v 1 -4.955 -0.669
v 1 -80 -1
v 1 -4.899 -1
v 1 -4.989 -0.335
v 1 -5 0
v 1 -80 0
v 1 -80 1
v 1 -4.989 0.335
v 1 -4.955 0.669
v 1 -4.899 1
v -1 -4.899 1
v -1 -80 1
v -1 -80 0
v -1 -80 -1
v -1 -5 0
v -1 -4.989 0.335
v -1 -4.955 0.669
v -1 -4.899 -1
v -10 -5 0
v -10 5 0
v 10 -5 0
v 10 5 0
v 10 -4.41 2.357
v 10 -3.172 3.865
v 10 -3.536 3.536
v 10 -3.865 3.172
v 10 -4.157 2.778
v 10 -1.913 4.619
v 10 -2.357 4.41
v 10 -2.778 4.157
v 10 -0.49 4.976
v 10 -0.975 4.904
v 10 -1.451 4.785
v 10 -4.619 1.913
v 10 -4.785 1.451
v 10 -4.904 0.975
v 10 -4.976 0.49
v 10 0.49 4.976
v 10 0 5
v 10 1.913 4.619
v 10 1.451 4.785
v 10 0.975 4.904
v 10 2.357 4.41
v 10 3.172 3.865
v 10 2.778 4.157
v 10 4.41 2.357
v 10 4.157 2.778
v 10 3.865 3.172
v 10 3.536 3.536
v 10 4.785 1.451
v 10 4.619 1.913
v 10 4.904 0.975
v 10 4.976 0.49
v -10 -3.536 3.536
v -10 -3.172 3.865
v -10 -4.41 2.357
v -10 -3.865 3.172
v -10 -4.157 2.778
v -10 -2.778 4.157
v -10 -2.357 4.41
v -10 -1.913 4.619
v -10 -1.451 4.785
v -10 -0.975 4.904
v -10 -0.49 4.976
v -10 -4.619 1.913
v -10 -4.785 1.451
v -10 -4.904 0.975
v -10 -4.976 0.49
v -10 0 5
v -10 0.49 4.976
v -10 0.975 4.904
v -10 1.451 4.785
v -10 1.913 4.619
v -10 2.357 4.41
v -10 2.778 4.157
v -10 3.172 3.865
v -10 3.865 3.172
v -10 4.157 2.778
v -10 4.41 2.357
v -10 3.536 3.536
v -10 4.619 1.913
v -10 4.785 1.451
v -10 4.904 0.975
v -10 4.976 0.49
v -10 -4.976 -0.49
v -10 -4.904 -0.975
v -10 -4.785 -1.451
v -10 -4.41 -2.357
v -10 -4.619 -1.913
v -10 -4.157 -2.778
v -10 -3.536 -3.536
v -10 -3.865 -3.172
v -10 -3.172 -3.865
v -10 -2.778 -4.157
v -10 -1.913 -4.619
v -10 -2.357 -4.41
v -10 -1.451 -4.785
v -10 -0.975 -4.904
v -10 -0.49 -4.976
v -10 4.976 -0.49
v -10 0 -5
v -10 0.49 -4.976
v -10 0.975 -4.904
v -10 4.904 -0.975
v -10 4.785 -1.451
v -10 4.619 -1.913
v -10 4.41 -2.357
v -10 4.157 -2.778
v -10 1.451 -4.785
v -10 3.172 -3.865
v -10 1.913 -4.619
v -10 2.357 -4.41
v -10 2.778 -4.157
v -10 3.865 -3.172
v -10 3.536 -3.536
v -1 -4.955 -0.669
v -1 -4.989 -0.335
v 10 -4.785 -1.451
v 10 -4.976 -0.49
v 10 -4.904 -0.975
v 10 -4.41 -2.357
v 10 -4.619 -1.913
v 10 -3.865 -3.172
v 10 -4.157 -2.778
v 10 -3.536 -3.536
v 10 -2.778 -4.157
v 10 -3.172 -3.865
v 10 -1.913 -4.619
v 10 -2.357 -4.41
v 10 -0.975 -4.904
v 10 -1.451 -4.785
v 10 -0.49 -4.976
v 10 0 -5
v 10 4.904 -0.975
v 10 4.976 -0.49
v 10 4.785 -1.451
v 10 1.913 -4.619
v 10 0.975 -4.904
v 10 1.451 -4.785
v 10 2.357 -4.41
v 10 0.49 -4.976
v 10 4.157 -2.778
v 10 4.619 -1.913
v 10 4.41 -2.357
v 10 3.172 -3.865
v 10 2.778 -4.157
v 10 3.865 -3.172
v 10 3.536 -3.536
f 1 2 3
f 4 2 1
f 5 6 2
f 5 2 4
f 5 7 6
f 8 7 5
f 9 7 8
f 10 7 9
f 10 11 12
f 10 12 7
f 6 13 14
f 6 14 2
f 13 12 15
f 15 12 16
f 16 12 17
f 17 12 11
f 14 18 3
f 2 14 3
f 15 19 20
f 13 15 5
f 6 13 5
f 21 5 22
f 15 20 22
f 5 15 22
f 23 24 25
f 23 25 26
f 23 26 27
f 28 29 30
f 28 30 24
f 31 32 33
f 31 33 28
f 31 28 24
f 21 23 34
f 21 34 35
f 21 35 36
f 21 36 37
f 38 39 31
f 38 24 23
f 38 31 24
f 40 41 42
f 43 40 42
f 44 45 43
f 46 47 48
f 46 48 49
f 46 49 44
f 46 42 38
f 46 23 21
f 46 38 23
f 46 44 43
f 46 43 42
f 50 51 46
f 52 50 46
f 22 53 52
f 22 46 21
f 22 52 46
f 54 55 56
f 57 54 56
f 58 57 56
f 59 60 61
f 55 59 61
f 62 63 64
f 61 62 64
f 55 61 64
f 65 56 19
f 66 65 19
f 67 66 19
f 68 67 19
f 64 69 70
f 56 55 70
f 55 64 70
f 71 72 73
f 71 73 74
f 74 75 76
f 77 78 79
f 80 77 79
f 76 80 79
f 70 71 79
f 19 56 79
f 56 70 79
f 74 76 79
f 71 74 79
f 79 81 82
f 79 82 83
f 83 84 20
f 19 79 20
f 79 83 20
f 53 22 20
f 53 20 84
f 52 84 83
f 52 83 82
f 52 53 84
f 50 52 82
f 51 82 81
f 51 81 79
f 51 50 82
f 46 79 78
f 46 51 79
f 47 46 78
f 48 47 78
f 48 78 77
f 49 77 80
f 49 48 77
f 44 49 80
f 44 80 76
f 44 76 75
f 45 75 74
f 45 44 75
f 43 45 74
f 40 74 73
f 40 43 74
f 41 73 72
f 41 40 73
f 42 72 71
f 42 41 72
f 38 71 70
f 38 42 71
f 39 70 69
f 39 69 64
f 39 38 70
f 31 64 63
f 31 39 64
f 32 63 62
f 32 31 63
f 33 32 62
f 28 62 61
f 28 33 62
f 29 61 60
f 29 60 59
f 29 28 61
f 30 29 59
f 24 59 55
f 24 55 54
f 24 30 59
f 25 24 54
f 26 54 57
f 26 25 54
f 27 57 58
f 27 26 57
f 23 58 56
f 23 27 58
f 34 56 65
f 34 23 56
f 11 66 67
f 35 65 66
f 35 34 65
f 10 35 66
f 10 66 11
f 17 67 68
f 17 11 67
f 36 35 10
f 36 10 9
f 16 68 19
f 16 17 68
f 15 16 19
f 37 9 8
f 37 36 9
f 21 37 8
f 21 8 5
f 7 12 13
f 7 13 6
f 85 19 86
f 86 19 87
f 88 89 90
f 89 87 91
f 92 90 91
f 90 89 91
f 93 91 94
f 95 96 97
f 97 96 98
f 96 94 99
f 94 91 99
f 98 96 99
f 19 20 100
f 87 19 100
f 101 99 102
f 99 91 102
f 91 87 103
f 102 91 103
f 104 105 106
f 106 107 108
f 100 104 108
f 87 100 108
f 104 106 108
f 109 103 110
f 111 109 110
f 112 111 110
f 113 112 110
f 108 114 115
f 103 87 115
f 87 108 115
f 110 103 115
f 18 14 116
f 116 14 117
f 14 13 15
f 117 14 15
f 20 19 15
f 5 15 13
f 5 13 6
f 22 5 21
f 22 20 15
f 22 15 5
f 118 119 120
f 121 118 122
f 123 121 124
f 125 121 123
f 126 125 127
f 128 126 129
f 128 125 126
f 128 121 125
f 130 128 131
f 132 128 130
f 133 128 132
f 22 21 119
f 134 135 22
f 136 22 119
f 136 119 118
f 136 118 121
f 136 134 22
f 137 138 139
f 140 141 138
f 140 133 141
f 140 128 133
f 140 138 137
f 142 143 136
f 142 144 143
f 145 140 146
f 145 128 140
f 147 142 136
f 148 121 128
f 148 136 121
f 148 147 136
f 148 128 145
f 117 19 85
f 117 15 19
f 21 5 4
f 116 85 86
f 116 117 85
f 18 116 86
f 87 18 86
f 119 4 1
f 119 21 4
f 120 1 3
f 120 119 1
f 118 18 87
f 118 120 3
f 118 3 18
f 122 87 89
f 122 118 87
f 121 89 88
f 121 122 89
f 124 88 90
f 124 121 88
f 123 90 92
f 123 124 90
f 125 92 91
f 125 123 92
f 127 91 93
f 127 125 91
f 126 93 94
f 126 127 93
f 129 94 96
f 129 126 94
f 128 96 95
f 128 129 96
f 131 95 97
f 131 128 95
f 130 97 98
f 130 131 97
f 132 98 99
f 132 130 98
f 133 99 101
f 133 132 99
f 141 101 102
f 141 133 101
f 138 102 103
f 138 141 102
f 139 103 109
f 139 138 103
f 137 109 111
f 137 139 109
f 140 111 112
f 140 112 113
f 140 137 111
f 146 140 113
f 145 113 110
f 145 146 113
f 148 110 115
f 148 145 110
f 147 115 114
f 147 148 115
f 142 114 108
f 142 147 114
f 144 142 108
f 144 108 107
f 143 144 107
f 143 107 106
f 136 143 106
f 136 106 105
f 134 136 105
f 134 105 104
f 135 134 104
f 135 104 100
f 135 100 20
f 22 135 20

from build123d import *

# Parameters (mm, degrees)
SKETCH1_R           = 5
BOSS_EXTRUDE1_DEPTH = 10
SKETCH2_W           = 2
SKETCH2_H           = 80
BOSS_EXTRUDE2_DEPTH = 1


with BuildPart() as part:
    # Sketch1 → Boss-Extrude1 (new, symmetric)
    with BuildSketch(Plane(origin=(0, 0, 0), x_dir=(0, 0, -1), z_dir=(1, 0, 0))):
        Circle(SKETCH1_R)
    extrude(amount=BOSS_EXTRUDE1_DEPTH, both=True)

    # Sketch2 → Boss-Extrude2 (add, symmetric)
    with BuildSketch(Plane.XY):
        with Locations((0, -40)):
            Rectangle(SKETCH2_W, SKETCH2_H)
    extrude(amount=BOSS_EXTRUDE2_DEPTH, both=True)


with BuildPart() as body_2:
    # Split1: the piece on the far side of the plane
    add(part.part)
    split(bisect_by=Plane.XY, keep=Keep.BOTTOM)


with BuildPart() as part_1:
    add(part.part)

    # Split1
    split(bisect_by=Plane.XY, keep=Keep.TOP)


solid = Compound([body_2.part, part_1.part])
